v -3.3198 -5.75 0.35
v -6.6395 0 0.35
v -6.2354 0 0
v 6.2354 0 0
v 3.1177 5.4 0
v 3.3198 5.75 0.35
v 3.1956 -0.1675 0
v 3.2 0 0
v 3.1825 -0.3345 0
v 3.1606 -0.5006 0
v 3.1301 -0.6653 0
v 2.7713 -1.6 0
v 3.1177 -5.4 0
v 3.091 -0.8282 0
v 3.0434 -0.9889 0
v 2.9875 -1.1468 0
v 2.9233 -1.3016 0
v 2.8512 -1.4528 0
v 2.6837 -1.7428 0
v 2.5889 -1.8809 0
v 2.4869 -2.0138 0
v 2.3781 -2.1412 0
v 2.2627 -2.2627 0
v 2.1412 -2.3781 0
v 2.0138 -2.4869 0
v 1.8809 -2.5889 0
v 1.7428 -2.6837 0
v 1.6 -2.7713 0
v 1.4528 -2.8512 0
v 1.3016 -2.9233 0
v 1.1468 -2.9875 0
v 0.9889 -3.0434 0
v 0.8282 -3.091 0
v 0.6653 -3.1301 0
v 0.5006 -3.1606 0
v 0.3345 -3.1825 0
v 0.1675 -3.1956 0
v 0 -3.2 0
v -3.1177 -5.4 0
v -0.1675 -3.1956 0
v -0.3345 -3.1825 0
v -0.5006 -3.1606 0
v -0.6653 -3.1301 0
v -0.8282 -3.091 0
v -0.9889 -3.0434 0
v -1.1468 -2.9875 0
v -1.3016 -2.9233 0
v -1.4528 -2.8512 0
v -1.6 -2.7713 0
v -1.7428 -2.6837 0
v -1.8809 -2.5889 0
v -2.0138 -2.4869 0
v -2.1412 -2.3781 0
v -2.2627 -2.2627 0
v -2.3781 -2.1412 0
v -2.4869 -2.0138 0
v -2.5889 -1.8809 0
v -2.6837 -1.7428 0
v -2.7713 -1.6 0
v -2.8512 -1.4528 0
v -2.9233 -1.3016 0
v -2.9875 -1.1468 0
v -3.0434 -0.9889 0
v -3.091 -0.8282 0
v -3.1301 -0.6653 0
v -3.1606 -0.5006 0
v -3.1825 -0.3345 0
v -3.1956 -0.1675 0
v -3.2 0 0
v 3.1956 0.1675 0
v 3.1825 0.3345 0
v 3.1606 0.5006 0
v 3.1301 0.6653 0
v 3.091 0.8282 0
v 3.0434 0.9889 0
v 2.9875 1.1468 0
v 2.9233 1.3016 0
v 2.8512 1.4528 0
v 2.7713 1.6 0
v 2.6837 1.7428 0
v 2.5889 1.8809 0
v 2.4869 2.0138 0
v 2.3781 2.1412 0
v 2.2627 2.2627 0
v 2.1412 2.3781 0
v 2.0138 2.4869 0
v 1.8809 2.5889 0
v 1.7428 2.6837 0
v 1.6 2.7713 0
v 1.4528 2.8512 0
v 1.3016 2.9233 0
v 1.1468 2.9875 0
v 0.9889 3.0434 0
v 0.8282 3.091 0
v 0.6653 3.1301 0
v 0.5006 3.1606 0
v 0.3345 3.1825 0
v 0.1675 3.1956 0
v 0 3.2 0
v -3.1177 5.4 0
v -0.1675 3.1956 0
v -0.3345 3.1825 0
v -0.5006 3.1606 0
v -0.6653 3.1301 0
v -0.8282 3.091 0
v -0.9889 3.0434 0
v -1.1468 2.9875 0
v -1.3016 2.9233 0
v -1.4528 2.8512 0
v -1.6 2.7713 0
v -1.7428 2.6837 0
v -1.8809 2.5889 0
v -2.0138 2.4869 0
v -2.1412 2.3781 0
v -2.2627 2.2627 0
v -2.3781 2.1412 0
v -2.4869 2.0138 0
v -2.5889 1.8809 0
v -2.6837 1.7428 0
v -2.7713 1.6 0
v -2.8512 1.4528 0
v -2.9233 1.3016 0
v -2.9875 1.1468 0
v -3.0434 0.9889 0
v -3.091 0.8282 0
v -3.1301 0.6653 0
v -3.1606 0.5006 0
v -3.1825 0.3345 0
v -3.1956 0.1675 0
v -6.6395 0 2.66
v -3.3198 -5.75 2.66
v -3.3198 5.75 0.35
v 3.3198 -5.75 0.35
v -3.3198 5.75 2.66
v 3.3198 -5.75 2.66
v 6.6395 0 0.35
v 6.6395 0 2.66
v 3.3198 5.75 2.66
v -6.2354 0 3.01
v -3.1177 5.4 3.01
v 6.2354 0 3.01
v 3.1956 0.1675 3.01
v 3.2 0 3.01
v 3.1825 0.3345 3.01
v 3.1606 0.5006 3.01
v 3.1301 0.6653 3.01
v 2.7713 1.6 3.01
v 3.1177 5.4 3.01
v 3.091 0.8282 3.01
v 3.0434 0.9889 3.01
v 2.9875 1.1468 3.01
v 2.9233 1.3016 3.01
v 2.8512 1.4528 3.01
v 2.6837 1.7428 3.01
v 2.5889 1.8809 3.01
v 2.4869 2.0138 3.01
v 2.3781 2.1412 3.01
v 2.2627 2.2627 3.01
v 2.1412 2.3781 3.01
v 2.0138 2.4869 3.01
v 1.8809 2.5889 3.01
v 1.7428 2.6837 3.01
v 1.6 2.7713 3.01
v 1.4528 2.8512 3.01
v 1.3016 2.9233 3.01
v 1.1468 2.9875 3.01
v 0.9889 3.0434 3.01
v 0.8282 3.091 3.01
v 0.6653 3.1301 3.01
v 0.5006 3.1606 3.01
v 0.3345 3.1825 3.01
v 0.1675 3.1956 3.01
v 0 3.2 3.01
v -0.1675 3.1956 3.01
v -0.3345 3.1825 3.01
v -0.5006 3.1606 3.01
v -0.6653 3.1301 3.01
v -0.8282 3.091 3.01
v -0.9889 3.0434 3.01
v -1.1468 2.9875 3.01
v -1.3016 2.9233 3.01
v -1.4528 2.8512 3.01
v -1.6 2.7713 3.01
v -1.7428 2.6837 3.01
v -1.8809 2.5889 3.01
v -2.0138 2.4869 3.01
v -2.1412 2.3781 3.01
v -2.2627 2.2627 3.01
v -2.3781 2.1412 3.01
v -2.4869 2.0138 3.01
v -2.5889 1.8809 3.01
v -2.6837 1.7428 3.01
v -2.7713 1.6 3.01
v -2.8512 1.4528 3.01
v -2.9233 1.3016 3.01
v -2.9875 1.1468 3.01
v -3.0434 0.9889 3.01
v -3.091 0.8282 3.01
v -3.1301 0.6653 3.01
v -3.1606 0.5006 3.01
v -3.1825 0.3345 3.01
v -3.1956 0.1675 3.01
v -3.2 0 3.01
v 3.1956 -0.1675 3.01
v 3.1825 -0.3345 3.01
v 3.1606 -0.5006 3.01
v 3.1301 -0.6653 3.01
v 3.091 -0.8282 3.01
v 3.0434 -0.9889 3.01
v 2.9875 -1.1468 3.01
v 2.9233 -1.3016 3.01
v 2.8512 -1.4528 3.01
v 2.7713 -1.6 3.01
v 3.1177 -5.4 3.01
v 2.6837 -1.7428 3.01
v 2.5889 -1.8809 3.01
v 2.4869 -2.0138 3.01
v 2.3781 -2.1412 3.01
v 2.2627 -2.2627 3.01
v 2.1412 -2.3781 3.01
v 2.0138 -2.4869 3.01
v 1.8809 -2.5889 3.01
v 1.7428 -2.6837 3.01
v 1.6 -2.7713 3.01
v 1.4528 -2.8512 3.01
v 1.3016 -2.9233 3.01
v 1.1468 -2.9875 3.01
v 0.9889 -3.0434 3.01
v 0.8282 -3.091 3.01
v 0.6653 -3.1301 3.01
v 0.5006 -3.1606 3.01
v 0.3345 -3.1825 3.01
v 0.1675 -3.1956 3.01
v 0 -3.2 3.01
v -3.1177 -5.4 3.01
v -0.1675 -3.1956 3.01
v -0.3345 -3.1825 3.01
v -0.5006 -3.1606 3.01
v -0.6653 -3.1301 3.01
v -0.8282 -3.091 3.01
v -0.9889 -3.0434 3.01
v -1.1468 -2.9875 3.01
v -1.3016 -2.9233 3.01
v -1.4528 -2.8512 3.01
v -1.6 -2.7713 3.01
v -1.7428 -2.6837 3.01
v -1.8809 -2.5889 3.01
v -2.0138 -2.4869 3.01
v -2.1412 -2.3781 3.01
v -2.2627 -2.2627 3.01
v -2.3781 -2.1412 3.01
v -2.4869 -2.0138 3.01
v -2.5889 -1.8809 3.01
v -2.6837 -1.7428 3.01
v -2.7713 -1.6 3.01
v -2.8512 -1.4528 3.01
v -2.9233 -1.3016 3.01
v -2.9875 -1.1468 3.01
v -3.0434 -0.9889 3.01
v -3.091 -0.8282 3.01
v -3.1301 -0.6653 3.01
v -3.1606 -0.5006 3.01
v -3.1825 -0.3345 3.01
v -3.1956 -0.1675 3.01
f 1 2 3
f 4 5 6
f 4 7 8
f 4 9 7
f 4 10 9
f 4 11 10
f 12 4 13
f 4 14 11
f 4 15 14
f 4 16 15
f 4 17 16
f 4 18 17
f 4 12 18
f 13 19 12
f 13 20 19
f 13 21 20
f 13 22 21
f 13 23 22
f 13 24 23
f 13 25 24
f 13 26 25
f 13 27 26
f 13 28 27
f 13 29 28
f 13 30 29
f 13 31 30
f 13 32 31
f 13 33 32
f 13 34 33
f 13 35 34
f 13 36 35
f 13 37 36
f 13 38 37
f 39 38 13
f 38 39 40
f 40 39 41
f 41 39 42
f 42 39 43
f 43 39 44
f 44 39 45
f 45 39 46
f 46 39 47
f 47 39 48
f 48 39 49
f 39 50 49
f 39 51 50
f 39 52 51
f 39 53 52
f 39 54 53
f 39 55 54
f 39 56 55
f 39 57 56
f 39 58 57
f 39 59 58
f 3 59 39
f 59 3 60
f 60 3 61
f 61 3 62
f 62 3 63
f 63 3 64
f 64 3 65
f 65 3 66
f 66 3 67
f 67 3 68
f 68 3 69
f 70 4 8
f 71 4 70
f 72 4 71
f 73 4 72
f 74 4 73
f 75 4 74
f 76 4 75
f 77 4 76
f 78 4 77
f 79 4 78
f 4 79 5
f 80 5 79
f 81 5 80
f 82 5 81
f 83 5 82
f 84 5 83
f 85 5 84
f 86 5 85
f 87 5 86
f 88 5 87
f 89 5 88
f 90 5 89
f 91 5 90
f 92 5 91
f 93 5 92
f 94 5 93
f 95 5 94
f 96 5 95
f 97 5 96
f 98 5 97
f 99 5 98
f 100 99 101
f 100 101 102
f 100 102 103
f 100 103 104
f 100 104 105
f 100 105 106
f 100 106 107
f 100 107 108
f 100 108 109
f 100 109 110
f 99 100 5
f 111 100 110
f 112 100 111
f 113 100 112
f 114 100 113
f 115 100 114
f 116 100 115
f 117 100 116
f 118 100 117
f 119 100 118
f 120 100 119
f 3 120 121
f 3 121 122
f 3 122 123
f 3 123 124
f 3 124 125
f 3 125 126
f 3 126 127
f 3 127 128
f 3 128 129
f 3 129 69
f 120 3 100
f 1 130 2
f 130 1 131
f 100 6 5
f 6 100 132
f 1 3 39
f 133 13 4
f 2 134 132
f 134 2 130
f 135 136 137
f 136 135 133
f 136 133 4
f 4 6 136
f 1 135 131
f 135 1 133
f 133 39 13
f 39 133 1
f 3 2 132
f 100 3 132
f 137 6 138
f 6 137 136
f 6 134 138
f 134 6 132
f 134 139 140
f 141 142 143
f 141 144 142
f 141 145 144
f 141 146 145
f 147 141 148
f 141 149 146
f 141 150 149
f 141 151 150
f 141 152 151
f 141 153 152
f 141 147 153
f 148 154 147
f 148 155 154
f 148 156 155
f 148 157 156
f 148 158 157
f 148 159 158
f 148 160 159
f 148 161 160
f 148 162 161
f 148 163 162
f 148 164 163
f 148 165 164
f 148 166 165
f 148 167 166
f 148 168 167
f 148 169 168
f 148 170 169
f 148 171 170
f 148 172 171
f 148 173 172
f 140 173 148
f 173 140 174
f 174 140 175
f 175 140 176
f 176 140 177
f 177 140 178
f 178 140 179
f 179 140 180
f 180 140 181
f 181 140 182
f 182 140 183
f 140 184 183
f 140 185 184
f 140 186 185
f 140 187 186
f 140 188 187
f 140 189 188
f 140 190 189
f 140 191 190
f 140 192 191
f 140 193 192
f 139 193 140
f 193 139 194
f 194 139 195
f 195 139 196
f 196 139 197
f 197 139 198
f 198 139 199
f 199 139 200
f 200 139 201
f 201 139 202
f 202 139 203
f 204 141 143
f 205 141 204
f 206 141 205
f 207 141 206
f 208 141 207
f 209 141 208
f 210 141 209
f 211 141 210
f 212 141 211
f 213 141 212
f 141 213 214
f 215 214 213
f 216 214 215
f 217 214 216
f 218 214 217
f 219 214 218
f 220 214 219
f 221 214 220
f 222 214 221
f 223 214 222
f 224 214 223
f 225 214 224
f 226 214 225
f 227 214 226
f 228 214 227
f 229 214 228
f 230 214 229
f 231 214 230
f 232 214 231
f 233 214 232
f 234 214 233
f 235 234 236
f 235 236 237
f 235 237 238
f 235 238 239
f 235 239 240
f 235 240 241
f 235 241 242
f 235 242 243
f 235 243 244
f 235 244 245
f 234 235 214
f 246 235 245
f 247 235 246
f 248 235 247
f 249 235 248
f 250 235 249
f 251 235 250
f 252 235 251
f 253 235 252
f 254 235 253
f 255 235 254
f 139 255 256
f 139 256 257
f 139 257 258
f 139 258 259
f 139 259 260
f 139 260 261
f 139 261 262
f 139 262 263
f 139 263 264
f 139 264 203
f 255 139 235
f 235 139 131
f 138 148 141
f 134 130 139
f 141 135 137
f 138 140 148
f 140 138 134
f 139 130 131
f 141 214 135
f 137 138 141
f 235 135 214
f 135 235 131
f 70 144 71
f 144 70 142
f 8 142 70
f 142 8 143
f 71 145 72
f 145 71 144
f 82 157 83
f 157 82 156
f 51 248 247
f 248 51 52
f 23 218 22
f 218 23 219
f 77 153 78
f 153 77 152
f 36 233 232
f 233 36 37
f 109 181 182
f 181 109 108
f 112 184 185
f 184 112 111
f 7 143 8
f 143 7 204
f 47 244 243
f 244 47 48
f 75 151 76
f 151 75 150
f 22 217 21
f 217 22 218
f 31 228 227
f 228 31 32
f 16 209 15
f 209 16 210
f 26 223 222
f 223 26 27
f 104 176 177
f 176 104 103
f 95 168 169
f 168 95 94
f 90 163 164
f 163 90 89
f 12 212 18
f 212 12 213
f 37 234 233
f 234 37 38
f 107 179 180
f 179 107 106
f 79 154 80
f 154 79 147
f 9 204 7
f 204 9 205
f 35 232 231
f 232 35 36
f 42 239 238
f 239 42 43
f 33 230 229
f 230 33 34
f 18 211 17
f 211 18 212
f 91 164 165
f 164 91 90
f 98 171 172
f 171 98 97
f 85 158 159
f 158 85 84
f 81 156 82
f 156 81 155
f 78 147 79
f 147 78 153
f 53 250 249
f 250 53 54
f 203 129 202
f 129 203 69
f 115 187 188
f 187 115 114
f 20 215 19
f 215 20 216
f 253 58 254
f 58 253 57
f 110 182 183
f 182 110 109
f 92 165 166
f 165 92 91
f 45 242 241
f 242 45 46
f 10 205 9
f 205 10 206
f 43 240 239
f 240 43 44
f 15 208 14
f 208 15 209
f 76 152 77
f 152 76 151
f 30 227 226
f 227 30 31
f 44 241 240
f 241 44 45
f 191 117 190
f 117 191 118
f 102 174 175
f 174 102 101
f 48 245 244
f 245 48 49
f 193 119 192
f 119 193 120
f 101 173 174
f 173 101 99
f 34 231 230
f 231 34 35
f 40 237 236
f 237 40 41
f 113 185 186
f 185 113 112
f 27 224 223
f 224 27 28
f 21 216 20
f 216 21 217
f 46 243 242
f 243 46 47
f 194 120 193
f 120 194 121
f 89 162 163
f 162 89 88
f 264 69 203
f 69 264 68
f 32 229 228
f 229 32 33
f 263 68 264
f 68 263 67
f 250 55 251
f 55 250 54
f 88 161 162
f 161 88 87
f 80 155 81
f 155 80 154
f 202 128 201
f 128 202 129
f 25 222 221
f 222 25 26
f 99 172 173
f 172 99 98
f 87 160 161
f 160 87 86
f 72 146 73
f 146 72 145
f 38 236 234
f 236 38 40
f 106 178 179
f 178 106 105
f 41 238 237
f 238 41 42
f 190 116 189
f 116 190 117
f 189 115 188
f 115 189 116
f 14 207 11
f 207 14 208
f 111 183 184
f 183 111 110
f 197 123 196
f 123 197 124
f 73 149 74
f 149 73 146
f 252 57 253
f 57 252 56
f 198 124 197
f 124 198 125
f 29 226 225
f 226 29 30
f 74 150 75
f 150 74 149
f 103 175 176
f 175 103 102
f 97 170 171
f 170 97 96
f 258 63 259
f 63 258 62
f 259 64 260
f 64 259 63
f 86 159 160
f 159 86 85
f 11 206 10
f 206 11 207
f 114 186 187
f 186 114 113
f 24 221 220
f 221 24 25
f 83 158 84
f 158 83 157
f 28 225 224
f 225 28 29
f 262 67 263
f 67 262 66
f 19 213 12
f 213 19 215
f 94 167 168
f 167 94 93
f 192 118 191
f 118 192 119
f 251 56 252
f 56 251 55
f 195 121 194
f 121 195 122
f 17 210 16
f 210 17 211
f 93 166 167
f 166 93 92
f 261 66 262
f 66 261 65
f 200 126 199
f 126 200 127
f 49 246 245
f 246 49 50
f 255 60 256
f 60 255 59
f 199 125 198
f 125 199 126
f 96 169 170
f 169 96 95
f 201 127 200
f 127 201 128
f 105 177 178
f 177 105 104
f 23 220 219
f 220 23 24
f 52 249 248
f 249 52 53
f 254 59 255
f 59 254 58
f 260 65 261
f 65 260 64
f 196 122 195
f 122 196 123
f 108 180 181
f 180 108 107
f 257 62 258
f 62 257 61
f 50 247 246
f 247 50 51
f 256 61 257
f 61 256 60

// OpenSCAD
$fn = 120;

screw_d = 6.0;          // nominal screw diameter (M6)
across_flats = 11.5;    // mm
thickness = 3.0;        // mm

// Typical M6 coarse pitch clearance-ish hole; adjust if you want tighter/looser
hole_d = 6.4;

// Small chamfer on top/bottom edges
chamfer = 0.35;

module hex_prism(af, h){
    // For a regular hexagon: across_flats = 2 * apothem
    // Circumradius R = apothem / cos(30°) = (af/2)/cos(30°)
    R = (af/2) / cos(30);
    linear_extrude(height=h)
        polygon([ for (i=[0:5]) [ R*cos(60*i), R*sin(60*i) ] ]);
}

module chamfered_hex_nut(af, h, ch){
    // Create chamfers by hulling between slightly different hex sizes
    // at z=0, z=ch, z=h-ch, z=h
    hull() {
        translate([0,0,0])      hex_prism(af - 2*ch, 0.01);
        translate([0,0,ch])     hex_prism(af,        0.01);
    }
    translate([0,0,ch])
        hex_prism(af, h - 2*ch);
    hull() {
        translate([0,0,h-ch])   hex_prism(af,        0.01);
        translate([0,0,h])      hex_prism(af - 2*ch, 0.01);
    }
}

difference() {
    chamfered_hex_nut(across_flats, thickness, chamfer);
    translate([0,0,-1])
        cylinder(d=hole_d, h=thickness+2);
}
